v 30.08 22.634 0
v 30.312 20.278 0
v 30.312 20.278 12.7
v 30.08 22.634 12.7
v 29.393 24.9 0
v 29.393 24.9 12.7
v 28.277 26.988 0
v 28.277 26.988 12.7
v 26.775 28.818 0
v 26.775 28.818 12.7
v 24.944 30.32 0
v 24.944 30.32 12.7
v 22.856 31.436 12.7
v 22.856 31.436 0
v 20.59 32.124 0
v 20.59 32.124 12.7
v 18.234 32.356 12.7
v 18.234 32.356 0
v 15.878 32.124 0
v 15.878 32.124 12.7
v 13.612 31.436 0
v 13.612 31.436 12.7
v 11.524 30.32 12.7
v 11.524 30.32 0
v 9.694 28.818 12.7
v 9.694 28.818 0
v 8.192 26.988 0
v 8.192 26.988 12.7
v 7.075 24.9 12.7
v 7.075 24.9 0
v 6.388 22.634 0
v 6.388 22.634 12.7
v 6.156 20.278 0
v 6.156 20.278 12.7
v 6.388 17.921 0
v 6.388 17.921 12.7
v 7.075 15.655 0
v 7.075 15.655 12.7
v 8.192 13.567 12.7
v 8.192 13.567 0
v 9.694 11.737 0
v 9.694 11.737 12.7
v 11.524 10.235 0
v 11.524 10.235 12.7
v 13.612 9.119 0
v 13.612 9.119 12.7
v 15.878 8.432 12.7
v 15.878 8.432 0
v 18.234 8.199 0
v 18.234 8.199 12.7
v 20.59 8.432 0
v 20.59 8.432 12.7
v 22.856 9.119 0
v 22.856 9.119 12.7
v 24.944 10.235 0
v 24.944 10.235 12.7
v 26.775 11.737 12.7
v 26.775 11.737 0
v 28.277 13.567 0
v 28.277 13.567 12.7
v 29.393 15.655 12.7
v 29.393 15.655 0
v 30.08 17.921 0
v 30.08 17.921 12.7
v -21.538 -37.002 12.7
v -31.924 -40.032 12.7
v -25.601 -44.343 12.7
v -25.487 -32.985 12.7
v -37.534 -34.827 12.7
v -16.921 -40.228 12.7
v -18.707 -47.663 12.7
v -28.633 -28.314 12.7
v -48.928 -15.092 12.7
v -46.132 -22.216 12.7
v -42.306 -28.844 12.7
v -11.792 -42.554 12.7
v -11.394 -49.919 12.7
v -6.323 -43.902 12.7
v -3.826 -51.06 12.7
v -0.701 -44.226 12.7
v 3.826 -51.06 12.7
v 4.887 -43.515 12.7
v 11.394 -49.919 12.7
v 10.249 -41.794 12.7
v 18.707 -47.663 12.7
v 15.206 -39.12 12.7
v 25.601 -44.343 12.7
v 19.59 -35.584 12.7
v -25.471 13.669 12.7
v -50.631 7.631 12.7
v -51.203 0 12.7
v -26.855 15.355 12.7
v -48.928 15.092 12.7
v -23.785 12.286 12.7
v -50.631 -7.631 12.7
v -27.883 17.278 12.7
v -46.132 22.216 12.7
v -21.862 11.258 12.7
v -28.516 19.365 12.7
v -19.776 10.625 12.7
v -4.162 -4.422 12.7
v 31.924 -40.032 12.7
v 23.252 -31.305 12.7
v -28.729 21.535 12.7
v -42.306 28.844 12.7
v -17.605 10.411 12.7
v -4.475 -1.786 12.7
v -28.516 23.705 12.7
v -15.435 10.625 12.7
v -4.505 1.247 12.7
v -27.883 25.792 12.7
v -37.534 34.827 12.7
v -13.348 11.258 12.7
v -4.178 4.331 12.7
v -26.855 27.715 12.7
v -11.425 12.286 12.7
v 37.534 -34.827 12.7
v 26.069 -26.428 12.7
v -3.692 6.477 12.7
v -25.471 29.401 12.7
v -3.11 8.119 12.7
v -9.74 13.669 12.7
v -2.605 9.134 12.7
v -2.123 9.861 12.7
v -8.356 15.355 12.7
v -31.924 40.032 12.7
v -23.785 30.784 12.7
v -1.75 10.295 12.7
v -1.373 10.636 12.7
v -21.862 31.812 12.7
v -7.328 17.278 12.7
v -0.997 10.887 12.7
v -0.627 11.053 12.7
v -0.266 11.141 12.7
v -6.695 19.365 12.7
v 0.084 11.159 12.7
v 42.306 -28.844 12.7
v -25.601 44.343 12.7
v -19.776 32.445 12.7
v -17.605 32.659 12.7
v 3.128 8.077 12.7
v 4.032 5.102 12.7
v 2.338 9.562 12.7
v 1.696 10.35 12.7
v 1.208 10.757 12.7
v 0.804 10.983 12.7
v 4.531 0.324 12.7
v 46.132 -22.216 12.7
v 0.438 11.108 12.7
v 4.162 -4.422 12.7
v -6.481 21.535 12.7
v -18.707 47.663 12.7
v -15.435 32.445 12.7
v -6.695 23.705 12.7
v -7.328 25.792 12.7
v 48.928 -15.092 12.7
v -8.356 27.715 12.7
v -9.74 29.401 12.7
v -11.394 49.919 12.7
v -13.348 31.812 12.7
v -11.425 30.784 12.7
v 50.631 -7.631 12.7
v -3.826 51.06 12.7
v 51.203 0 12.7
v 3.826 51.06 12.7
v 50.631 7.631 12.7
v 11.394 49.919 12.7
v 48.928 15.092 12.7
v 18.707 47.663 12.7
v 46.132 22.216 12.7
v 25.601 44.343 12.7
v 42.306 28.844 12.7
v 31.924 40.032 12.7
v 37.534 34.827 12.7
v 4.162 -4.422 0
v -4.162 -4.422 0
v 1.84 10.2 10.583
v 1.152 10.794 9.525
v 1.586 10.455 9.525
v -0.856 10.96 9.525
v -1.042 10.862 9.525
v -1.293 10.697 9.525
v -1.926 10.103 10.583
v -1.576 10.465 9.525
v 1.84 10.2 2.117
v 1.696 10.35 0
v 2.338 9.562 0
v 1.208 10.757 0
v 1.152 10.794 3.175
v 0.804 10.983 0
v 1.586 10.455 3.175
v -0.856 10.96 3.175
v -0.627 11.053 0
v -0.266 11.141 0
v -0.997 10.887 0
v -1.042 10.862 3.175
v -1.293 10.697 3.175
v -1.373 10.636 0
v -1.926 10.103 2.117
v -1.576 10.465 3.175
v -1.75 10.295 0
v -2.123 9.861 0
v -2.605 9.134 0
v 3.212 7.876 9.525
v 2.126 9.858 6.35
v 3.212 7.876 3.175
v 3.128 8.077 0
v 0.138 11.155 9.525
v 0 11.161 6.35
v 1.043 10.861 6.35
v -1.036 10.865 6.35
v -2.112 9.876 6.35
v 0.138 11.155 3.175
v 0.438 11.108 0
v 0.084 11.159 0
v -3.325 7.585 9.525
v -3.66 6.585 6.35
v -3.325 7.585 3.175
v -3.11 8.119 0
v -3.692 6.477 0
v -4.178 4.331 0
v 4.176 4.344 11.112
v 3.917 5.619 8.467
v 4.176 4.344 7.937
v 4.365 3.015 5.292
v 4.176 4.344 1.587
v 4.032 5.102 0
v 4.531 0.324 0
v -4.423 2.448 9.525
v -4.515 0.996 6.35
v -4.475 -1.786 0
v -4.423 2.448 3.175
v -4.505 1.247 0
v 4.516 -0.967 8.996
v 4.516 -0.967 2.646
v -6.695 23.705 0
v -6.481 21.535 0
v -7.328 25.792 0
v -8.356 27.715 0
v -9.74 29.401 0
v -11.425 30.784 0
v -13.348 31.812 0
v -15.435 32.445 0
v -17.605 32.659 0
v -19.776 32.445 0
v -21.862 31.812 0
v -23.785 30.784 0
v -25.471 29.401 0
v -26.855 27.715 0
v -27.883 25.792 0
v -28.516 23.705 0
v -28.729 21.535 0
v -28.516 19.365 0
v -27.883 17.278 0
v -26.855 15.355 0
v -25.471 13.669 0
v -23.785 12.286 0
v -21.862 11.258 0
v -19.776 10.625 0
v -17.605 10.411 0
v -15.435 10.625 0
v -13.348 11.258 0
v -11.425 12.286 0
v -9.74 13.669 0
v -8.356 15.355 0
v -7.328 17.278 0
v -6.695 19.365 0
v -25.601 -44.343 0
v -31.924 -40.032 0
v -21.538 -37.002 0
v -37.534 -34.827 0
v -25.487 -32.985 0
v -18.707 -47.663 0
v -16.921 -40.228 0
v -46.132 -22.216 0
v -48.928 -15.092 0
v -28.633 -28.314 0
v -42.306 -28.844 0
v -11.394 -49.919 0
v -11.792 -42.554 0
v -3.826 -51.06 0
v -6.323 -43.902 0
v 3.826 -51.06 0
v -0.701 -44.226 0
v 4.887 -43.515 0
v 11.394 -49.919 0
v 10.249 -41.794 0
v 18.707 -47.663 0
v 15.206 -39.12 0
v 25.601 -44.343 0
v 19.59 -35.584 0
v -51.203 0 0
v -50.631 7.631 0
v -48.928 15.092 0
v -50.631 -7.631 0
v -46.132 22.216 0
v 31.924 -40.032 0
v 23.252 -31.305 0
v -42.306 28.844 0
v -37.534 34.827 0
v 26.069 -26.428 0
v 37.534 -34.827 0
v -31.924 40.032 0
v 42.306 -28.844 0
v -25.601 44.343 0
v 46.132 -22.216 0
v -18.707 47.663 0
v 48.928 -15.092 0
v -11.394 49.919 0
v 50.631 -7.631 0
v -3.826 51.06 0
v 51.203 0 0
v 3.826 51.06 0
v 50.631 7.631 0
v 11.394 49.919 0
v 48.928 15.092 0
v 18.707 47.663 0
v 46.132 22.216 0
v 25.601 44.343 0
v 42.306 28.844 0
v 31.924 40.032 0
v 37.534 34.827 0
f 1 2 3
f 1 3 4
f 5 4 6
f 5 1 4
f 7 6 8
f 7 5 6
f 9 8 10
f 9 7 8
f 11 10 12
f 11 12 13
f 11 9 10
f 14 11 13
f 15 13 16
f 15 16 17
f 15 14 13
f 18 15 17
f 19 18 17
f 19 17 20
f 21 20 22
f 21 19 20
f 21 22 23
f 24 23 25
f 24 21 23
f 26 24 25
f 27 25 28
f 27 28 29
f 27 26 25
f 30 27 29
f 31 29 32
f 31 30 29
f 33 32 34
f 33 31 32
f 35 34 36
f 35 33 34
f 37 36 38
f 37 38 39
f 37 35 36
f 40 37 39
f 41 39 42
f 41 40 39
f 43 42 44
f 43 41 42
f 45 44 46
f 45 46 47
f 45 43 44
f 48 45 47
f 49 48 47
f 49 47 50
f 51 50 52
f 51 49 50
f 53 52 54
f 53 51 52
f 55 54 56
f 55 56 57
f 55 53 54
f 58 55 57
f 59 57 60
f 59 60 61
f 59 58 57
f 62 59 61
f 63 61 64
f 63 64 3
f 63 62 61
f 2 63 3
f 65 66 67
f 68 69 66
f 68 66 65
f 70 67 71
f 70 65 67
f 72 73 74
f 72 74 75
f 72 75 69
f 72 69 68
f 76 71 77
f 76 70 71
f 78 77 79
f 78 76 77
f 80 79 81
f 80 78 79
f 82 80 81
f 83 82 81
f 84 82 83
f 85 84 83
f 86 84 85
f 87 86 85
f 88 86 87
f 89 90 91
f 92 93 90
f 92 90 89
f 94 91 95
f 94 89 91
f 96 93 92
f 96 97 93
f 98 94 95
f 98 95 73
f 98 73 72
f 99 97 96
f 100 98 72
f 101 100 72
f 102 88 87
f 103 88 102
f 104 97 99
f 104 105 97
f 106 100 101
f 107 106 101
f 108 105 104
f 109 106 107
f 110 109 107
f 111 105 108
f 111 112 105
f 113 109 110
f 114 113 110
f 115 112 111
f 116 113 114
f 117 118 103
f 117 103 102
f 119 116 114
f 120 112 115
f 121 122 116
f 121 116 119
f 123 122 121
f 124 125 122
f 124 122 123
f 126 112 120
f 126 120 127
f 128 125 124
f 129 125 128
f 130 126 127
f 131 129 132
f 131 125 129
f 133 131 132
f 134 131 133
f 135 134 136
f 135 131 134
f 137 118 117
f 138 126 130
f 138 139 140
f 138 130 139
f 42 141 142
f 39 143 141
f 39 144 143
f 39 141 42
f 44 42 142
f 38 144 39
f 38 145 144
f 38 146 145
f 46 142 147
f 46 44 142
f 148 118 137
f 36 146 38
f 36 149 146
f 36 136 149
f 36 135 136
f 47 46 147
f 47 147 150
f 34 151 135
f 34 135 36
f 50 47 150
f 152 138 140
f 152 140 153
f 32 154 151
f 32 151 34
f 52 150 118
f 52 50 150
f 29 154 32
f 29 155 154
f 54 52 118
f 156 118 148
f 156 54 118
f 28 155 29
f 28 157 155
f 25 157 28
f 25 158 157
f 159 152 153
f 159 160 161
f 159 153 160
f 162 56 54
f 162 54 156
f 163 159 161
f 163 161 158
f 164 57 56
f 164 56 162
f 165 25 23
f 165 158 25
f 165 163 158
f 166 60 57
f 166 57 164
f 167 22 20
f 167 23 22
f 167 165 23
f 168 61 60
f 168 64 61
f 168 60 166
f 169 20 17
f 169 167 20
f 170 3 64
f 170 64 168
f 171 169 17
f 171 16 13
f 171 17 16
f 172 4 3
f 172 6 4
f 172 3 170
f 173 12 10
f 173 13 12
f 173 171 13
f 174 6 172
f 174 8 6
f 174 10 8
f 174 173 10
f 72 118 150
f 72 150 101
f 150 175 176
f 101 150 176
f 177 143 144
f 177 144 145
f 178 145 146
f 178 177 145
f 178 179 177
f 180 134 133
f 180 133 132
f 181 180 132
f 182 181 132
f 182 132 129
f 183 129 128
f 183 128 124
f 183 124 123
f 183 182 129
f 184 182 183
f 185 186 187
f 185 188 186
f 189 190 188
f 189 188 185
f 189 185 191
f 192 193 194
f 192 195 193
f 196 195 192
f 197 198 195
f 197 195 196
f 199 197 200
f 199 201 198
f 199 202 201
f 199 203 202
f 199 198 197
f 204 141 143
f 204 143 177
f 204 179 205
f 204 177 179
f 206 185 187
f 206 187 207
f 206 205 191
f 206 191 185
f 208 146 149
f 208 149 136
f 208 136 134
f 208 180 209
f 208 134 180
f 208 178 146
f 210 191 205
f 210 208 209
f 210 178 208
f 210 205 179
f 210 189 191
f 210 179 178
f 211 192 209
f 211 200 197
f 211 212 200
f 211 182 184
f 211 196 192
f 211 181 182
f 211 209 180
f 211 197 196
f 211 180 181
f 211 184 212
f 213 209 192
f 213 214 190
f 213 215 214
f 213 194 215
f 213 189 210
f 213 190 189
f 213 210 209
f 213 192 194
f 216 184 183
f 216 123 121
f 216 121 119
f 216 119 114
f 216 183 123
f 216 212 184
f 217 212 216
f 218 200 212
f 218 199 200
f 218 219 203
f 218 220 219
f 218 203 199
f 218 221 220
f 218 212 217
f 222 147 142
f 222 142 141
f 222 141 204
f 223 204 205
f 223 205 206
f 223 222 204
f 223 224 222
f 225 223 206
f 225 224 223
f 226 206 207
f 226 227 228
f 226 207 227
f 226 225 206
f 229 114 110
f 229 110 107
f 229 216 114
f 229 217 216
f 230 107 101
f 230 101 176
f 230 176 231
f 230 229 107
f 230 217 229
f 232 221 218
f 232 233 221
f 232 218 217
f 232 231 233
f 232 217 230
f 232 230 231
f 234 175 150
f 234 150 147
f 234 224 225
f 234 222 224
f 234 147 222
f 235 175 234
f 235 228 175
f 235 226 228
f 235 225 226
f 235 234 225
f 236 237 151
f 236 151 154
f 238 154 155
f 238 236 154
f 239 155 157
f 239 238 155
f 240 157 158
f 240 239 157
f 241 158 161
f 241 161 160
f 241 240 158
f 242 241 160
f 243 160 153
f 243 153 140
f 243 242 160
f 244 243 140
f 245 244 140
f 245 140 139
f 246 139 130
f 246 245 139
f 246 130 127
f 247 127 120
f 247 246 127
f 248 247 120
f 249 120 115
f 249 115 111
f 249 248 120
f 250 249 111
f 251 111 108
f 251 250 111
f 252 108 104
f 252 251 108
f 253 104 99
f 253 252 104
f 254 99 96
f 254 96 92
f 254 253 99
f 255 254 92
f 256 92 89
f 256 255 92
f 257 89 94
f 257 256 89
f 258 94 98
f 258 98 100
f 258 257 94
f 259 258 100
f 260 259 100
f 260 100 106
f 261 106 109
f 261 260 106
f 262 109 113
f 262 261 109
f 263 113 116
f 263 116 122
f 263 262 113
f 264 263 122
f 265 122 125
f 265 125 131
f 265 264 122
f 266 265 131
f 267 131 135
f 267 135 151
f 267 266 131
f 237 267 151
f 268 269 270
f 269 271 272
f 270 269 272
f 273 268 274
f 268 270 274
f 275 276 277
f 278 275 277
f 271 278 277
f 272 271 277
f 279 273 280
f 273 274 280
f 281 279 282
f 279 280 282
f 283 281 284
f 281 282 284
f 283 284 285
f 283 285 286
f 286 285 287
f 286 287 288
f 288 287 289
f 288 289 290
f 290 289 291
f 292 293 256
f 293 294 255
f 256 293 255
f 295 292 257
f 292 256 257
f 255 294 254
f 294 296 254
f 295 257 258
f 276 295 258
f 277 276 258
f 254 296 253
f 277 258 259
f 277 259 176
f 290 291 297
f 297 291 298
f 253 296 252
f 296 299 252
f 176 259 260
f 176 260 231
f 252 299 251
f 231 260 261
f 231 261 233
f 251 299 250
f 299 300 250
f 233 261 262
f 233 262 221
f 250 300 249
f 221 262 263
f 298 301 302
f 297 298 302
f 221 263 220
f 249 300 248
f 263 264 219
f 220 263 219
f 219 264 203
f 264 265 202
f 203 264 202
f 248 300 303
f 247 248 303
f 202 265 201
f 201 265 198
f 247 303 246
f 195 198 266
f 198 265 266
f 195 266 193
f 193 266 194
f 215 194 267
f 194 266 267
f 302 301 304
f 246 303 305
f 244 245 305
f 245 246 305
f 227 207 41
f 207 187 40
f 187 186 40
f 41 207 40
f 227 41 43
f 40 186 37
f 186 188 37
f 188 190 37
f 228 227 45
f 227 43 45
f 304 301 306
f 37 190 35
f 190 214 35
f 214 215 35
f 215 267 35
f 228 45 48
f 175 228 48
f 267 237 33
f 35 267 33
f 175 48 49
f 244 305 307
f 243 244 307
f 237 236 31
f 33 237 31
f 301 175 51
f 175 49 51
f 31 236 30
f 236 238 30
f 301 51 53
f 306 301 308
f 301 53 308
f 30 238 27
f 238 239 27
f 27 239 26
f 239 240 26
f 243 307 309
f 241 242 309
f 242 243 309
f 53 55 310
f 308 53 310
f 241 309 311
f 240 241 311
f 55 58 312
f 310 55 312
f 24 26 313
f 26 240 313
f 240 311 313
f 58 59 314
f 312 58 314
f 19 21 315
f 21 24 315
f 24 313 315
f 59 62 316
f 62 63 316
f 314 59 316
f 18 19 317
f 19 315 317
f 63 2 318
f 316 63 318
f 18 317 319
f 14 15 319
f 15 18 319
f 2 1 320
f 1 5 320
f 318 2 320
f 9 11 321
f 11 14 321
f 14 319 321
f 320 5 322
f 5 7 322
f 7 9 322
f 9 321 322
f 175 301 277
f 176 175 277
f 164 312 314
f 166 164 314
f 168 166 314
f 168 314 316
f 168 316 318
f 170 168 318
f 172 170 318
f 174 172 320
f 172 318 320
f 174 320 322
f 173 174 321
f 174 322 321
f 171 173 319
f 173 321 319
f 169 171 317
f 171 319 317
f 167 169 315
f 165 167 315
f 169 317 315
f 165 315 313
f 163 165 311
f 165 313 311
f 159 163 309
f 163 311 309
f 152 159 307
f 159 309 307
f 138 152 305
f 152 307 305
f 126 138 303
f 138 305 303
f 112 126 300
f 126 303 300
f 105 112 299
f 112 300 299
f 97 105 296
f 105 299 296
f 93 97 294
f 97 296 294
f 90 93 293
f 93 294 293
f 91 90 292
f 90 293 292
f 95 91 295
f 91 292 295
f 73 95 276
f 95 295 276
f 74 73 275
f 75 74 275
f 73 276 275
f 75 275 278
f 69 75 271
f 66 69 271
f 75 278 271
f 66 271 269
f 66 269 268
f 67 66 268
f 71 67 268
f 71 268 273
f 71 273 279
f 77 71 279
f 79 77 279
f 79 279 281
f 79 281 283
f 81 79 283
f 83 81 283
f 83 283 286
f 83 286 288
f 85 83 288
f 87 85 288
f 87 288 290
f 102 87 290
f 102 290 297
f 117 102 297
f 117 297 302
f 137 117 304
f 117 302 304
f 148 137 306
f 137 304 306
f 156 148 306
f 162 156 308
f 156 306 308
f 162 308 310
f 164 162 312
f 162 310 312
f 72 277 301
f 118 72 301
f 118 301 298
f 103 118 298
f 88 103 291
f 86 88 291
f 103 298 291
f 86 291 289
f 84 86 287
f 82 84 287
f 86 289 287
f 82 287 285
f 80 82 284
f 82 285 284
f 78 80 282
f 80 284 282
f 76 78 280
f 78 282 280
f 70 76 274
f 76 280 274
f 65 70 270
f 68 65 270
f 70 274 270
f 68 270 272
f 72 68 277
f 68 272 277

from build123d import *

# Parameters (mm, degrees)
F0_R     = 51.2028826098
F0_R_2   = 11.123942978
F0_R_3   = 12.0781304444
F1_DEPTH = 12.7


with BuildPart() as f1:
    # F0 (on Top) → F1 (new body)
    with BuildSketch(Plane.XY):
        Circle(F0_R)
        with BuildLine():
            ThreePointArc((26.0693728924, -26.4278631657), (-0.7005850014, -44.2258215238), (-28.6329444498, -28.3141508698))
            Line((-28.6329444498, -28.3141508698), (26.0693728924, -26.4278631657))
        make_face(mode=Mode.SUBTRACT)
        with BuildLine():
            add(Edge.make_bspline(
                [(4.1622381729, -4.4216929377), (6.8932937771, 11.1605301499), (0, 11.1605301499), (-6.8932937771, 11.1605301499), (-4.1622381729, -4.4216929377)],
                knots=[1.1634325355, 1.1634325355, 1.1634325355, 3.1415926536, 3.1415926536, 5.1197527717, 5.1197527717, 5.1197527717], degree=2, weights=[1, 0.5494587228, 1, 0.5494587228, 1]))
            Line((4.1622381729, -4.4216929377), (-4.1622381729, -4.4216929377))
        make_face(mode=Mode.SUBTRACT)
        with Locations((-17.6053456962, 21.5351078659)):
            Circle(F0_R_2, mode=Mode.SUBTRACT)
        with Locations((18.2341039181, 20.2775839716)):
            Circle(F0_R_3, mode=Mode.SUBTRACT)
    extrude(amount=F1_DEPTH)


solid = f1.part
